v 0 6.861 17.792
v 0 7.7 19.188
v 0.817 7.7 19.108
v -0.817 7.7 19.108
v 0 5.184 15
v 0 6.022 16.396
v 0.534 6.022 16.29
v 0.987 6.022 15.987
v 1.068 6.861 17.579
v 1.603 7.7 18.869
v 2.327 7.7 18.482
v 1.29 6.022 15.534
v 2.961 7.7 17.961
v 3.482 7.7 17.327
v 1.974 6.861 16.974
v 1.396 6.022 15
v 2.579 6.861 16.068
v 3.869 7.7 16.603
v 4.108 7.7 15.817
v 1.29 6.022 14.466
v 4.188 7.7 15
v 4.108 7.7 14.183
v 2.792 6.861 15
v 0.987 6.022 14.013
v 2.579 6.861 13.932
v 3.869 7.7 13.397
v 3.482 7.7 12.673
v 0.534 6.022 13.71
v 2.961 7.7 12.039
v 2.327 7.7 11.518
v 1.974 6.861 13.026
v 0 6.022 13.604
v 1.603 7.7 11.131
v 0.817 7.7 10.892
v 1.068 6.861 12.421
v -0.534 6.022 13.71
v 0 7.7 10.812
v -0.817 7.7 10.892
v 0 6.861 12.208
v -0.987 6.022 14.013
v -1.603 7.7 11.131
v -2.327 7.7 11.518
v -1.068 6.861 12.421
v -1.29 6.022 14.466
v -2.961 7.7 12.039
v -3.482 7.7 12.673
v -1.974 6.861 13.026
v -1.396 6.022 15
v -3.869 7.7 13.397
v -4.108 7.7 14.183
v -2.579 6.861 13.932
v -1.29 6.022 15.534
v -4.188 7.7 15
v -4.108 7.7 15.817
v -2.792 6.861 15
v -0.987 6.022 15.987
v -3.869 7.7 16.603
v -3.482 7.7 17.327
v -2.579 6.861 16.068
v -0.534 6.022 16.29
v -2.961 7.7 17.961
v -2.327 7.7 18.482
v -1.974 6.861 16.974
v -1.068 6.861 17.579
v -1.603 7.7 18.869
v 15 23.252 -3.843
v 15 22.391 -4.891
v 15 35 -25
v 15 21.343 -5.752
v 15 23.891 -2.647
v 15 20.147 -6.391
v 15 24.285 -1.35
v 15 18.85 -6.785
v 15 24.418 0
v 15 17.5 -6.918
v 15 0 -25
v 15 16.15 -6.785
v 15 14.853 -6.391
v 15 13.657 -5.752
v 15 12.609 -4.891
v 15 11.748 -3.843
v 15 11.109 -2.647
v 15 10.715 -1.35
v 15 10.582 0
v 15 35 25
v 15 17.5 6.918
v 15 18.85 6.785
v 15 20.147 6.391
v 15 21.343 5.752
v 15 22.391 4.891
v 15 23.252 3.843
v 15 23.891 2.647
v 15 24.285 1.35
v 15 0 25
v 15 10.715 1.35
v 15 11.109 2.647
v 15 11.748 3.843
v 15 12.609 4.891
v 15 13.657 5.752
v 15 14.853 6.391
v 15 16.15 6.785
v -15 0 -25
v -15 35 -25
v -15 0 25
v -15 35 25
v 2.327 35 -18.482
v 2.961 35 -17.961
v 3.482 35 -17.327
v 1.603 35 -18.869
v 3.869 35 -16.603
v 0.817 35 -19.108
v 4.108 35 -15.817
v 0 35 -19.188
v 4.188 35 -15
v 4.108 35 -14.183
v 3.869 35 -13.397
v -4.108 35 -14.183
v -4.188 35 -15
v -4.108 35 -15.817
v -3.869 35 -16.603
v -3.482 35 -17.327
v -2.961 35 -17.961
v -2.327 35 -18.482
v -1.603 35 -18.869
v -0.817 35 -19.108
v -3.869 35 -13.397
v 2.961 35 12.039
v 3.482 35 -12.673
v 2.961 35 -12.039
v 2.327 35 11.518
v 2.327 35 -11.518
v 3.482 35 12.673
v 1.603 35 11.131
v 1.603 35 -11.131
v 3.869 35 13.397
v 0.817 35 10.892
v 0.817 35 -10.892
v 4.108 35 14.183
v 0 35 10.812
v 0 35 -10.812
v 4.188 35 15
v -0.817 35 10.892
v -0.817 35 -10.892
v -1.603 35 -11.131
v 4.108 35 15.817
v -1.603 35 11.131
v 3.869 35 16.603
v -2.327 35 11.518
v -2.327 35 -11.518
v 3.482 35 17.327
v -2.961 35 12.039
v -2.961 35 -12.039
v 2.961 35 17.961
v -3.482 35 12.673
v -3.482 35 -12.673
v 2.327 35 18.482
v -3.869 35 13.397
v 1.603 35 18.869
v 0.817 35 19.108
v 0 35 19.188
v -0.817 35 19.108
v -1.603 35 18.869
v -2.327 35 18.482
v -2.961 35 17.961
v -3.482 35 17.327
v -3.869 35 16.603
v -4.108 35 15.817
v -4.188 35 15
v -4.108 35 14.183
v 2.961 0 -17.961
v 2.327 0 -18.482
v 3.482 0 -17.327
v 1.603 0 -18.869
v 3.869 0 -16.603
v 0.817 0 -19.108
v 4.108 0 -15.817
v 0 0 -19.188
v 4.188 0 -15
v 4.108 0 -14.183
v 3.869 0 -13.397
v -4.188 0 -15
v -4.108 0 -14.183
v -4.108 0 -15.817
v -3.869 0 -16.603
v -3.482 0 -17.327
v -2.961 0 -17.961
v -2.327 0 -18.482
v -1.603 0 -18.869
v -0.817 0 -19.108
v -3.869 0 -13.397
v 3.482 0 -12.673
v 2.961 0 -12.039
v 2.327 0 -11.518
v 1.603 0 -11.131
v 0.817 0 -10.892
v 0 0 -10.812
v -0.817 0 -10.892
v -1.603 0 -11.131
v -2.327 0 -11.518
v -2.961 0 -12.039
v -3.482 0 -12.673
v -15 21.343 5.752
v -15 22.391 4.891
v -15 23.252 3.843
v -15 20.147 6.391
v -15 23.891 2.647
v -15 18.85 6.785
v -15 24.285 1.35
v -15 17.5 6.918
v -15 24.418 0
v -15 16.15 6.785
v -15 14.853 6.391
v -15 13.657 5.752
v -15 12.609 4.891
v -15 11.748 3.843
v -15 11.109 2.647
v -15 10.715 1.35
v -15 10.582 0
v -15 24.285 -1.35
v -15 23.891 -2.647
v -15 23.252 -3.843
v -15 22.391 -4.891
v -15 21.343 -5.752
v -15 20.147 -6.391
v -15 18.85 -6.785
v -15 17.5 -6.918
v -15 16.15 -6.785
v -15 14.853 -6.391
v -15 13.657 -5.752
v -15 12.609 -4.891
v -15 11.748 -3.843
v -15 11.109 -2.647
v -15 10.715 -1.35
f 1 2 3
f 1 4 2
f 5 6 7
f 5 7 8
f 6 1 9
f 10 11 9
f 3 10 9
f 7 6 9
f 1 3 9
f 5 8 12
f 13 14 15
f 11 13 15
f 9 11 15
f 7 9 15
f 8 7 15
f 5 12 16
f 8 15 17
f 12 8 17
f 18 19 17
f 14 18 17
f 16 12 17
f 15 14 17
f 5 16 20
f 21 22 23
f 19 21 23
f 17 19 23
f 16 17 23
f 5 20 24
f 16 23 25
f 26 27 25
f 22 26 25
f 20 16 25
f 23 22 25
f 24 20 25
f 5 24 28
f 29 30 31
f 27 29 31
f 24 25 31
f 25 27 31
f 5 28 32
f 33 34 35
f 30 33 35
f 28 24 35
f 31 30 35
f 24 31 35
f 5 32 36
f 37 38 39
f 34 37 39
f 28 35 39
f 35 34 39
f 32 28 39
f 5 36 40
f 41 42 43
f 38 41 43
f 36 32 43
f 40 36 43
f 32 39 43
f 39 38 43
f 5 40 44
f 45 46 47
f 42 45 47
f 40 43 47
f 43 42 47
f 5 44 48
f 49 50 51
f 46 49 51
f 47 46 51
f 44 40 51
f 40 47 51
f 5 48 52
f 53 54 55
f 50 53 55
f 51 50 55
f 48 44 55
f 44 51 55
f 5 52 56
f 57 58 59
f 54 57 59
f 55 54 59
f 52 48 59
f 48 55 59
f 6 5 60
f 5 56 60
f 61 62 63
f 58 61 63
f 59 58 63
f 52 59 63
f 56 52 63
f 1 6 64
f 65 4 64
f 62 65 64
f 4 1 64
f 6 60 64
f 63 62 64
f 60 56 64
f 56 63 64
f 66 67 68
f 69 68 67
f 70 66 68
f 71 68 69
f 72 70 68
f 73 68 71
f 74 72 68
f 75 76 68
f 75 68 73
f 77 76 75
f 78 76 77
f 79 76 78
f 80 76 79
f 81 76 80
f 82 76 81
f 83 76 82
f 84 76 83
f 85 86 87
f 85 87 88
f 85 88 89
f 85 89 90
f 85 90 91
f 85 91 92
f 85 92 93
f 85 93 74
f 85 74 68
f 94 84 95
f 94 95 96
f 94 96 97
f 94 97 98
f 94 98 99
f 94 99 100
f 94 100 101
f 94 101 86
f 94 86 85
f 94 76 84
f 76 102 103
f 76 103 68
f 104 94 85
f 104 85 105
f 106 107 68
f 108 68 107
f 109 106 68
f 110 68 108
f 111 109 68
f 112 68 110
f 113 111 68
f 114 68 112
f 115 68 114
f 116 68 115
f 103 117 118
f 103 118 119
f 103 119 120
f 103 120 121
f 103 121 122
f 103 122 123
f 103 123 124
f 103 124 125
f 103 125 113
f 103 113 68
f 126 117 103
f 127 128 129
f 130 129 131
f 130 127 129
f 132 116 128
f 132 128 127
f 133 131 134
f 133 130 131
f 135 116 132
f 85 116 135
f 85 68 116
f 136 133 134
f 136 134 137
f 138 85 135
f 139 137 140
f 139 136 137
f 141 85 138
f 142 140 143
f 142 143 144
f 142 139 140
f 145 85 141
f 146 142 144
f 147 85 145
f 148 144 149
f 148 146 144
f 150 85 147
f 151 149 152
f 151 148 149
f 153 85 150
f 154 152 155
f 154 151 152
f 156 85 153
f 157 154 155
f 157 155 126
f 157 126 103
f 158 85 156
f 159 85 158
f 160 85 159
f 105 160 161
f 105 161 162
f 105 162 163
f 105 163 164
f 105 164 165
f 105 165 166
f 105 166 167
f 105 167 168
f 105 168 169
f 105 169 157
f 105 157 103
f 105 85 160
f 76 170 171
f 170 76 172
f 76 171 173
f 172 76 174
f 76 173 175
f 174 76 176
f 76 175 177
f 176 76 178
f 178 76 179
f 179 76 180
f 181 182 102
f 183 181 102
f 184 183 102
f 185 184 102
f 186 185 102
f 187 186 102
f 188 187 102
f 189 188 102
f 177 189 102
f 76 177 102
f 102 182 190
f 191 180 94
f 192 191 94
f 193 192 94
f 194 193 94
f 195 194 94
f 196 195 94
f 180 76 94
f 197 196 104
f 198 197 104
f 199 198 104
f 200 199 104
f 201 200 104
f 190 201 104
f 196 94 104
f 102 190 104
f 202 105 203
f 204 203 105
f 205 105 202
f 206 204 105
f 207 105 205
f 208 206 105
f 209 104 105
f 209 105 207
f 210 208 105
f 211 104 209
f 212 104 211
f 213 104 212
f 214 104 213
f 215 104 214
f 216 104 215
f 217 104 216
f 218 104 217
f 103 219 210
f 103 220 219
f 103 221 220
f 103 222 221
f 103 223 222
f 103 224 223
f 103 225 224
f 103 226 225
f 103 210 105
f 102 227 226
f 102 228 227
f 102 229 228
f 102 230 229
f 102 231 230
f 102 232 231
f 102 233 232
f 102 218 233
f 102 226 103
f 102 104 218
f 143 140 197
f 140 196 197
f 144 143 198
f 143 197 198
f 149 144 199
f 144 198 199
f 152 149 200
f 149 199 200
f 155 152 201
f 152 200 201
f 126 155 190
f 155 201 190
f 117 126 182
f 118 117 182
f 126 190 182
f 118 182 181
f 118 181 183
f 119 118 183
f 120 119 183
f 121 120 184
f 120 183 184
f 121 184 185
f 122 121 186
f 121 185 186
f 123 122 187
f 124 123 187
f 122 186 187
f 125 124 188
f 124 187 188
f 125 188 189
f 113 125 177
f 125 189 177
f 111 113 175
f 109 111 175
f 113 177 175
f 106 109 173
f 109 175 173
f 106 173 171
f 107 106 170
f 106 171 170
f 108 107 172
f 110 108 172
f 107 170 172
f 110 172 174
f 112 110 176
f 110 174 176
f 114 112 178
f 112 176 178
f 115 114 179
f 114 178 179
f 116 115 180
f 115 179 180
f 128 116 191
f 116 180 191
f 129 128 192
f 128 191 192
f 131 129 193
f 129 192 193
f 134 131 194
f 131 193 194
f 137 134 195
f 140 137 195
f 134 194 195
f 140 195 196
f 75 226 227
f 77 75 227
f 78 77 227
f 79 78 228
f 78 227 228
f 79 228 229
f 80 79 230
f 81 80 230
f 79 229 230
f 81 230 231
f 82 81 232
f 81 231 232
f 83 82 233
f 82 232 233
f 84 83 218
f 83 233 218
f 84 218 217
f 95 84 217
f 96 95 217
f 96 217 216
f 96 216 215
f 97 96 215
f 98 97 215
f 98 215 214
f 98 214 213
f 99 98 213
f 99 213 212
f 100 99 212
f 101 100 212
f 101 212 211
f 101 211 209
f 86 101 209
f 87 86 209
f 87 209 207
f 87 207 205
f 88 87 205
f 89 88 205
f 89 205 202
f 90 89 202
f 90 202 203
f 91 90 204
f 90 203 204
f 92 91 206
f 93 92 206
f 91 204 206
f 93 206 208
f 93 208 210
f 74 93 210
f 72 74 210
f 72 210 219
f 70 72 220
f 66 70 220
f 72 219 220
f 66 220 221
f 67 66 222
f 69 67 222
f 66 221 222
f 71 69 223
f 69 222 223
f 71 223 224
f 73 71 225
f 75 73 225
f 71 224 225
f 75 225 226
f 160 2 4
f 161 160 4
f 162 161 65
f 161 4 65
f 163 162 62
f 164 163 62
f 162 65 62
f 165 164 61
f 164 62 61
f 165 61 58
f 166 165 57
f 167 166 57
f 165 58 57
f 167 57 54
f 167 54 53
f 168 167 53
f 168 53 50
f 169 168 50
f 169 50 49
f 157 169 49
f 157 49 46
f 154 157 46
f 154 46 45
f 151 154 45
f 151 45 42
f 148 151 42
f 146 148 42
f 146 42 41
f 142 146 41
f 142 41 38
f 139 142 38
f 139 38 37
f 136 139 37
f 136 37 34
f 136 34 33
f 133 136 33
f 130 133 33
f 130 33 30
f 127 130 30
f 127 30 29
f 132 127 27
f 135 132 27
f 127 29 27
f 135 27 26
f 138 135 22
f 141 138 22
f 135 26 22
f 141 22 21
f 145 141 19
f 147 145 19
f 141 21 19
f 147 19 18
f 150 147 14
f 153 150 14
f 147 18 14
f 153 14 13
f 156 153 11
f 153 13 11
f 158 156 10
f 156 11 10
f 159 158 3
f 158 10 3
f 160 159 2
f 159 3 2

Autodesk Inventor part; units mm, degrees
ref_plane "YZ Plane" through (0, 0, 0) normal (1, 0, 0) x (0, 1, 0)
ref_plane "XZ Plane" through (0, 0, 0) normal (0, 1, 0) x (-1, 0, 0)
ref_plane "XY Plane" through (0, 0, 0) normal (0, 0, 1) x (1, 0, 0)
sketch "Esboço1" plane through (0, 0, 0) normal (0, 1, 0) x (-1, 0, 0)
  line L0 (15, -25) -> (-15, -25)
  line L1 (-15, -25) -> (-15, 25)
  line L2 (-15, 25) -> (15, 25)
  line L3 (15, 25) -> (15, -25)
  line L4 (15, -25) -> (-15, 25) construction
  line L5 (-15, -25) -> (15, 25) construction
  point P0 (0, 0)
  dimension "d0" = 30
  dimension "d1" = 50
extrude "Extrusão1" add sketch "Esboço1" along normal blind 35
sketch "Esboço3" plane through (0, 35, 0) normal (0, 1, 0) x (1, 0, 0)
  line L0 (-15, -25) -> (15, -25) projected
  line L1 (-15, 25) -> (-15, -25) projected
  point P0 (0, 0)
  point P1 (0, -15)
  dimension "d4" = 10
  dimension "d5" = 15
hole "Furo1" at (0, 35, 15) direction (0, -1, 0) diameter 8.376 depth 27.3 tip angle 118 thread size "M10x1.5" class "6H" standard "ISO Metric profile"
sketch "Esboço4" plane through (0, 35, 0) normal (0, 1, 0) x (1, 0, 0)
  line L0 (15, 25) -> (-15, 25) projected
  line L1 (-15, 25) -> (-15, -25) projected
  point P0 (0, 0)
  point P1 (0, 15)
  dimension "d13" = 10
  dimension "d14" = 15
hole "Furo2" at (0, 35, -15) direction (0, -1, 0) diameter 8.376 end through all thread size "M10x1.5" class "6H" standard "ISO Metric profile"
sketch "Esboço5" plane through (15, 0, 25) normal (1, 0, 0) x (0, 0, -1)
  line L0 (0, 0) -> (0, 35) projected
  line L1 (0, 35) -> (50, 35) projected
  point P0 (25, 0)
  point P1 (25, 17.5)
  dimension "d22" = 25
  dimension "d23" = 17.5
hole "Furo3" at (15, 17.5, 0) direction (-1, 0, 0) diameter 13.835 end through all thread size "M16x2" class "6H" standard "ISO Metric profile"
properties part number "3D Model"
